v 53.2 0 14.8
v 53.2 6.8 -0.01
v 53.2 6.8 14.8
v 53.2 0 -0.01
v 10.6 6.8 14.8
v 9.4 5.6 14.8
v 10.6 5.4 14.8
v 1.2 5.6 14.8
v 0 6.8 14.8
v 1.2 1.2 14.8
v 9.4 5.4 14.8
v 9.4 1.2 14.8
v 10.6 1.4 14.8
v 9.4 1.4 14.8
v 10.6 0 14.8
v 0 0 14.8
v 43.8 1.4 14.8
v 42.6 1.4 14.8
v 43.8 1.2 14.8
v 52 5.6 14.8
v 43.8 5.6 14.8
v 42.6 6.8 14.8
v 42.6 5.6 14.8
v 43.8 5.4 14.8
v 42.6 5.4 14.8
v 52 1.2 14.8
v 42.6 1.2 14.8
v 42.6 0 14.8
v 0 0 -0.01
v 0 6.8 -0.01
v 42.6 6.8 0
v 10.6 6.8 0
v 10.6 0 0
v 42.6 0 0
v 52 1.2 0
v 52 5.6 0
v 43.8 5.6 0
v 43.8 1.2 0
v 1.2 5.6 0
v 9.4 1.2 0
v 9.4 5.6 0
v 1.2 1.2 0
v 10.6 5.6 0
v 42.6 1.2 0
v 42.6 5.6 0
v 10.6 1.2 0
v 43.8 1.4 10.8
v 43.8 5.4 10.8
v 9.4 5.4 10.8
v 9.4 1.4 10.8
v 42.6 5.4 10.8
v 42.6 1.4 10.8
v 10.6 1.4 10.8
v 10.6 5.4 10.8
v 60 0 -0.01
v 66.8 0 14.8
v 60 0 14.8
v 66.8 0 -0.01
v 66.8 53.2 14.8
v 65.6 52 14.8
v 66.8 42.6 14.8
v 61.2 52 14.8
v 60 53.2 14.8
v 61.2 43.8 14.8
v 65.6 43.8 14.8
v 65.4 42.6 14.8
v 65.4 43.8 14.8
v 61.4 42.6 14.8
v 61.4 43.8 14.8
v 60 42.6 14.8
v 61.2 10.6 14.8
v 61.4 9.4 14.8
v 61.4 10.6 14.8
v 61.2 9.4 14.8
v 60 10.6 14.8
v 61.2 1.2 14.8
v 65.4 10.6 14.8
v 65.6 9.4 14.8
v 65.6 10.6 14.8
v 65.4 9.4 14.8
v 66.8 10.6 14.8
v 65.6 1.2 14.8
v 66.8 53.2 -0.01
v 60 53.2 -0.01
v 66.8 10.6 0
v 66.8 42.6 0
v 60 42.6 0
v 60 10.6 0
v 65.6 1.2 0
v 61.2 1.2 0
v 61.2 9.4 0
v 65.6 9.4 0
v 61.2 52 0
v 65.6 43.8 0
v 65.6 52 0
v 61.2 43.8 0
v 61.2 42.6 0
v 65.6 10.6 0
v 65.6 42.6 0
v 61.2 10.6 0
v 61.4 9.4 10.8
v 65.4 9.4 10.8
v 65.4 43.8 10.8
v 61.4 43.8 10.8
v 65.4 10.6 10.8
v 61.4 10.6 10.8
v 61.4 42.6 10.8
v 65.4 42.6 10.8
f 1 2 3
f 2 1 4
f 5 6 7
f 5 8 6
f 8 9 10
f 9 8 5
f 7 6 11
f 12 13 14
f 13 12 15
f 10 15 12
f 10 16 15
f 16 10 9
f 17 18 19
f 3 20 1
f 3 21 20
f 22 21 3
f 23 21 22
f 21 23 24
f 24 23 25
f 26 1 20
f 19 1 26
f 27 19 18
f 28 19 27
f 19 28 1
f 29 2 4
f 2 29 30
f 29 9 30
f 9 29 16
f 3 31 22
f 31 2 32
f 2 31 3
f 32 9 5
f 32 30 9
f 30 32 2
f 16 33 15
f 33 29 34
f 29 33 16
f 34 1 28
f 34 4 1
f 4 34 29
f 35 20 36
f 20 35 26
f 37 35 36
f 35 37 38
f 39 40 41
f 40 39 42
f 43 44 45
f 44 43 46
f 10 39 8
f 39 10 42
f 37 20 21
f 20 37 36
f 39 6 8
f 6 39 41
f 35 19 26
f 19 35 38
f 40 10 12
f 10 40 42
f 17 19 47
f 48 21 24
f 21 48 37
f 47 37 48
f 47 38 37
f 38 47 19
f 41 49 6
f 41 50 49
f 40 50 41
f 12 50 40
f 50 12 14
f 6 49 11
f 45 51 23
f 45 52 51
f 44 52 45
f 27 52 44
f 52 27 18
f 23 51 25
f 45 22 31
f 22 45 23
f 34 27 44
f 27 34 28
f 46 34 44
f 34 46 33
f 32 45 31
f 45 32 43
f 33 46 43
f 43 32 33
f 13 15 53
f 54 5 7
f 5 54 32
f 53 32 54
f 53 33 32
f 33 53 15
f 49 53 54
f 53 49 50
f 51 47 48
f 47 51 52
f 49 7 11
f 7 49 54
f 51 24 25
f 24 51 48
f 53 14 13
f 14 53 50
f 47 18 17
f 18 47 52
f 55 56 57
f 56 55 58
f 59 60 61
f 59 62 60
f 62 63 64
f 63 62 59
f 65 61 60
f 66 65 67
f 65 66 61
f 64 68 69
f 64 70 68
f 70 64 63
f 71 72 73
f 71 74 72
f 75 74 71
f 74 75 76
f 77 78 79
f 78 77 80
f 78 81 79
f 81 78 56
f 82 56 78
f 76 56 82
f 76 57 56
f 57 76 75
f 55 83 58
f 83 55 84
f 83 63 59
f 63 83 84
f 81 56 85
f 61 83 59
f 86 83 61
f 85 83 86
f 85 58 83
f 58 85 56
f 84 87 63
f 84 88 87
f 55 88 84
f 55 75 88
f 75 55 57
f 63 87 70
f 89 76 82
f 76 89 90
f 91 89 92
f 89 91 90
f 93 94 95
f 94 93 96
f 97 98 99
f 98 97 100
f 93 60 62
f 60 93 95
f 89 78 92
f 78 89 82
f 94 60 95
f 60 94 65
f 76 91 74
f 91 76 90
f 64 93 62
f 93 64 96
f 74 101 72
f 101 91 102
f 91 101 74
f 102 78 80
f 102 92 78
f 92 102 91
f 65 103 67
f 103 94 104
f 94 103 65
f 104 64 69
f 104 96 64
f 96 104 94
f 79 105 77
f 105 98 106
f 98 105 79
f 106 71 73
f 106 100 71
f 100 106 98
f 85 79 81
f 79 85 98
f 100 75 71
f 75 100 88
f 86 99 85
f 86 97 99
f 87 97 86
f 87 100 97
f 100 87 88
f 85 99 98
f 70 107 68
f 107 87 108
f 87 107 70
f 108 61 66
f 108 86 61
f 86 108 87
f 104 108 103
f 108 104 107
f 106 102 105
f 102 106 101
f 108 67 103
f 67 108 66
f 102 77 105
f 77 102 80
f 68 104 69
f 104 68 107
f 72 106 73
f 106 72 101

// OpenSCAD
// file: ../../Base/Boxes.scad
// Fischertechnik Box Foundation
// Pre-designed Boxes

use <Constants.scad>

include <PlacementOptions.scad>

box190Width = 190;
box190Depth = 130;
box130Width = 130;
box130Depth = 95;
boxUsageHeight = 33.9;
boxWallThickness = 2.4;
boxBaseThickness = 1.0;

// getBoxWallThickness()
// Gets the wall thickness of a Fischertechnik Box

function getBoxWallThickness() = boxWallThickness;

// Gets the usable height of a fischertechnik box
function getBoxUsageHeight() = boxUsageHeight;

// Gets the thickness of the Fischertechnik box base.
function getBoxBaseThickness() = boxBaseThickness;

// Gets the usable inner space of a Box 190 as an x/y-list
function getBox190Space() = [
    box190Width - 2*getBoxWallThickness(), 
    box190Depth - 2*getBoxWallThickness() ];

// Imports the Fischertechnik empty box 130x190 mm and places it at position 0,0
// 190x130 are the outer sizes, the inner space is slightly smaller. Use getBox190Space() to get the inner sizes.
// This module needs the STL file "Fischertechnik Box 130x190.stl" in the library path.
// The box is positioned that the usable inner space is at the 0,0,0 position. The

module Box190() {
    translate([-getBoxWallThickness(),-getBoxWallThickness(),-getBoxBaseThickness()])
        import("Fischertechnik Box 130x190.stl", convexity=3);
}

// Gets the usable inner space of a Box 130 as an x/y-list
function getBox130Space() = [
    box130Width - 2*getBoxWallThickness(), 
    box130Depth - 2*getBoxWallThickness() ];

// Imports the Fischertechnik empty box 95x130 mm and places it at position 0,0
// 190x130 are the outer sizes, the inner space is slightly smaller. Use getBox190Space() to get the inner sizes.
// This module needs the STL file "Fischertechnik Box 95x130.stl" in the library path.
// The box is positioned that the usable inner space is at the 0,0,0 position. The

module Box130() {
    translate([-getBoxWallThickness(),-getBoxWallThickness(),-getBoxBaseThickness()])
        import("Fischertechnik Box 95x130.stl", convexity=3);
}

// Creates a web at the specified box walls
// corner 0 = LowerLeft, 1 = UpperLeft, 2 = UpperRight, 3 = LowerRight
// side 0 = LeftOfCorner, 1 = RightOfCorner
// distance = Distance in mm from the corner
// box = inner width and depth of the box (default: Box 190)
// webWidth = length of the web (default is 3 mms)
// webThickness = thickness of the web (default is 1 mm)

module BoxWeb(corner, side, distance, box=getBox190Space(), webWidth=3, webThickness=1.0) {
    sink = getBoxWallThickness()/2;

    width = (corner % 2 == 0) ? 
            (side == LeftOfCorner ? webWidth : webThickness) :
            (side == LeftOfCorner ? webThickness : webWidth);

    depth = (corner % 2 == 0) ? 
            (side == RightOfCorner ? webWidth : webThickness) :
            (side == RightOfCorner ? webThickness : webWidth);
    
    xDiff = corner == LowerLeft ? 
                (side == LeftOfCorner ? -sink : distance) :
            (corner == UpperLeft ?                
                (side == LeftOfCorner ? distance : -sink) :
            (corner == UpperRight ?
                (side == LeftOfCorner ? box.x-webWidth+sink : box.x-distance-webThickness) :
                (side == LeftOfCorner ? box.x-distance-webThickness: box.x-webWidth+sink)));

    yDiff = corner == LowerLeft ? 
                (side == RightOfCorner ? -sink : distance) :
            (corner == UpperLeft ?
                (side == RightOfCorner ? box.y-distance : box.y-webWidth+sink) :
            (corner == UpperRight ?
                (side == RightOfCorner ? box.y-webWidth+sink : box.y-distance) :
                (side == RightOfCorner ? distance : -sink)));
    
    translate([xDiff, yDiff, -getExcess()])
        cube([width, depth, boxUsageHeight + 2*getExcess()]);
}
// file: ../../Base/Rotation.scad
// Fischertechnik Box Foundation
// Geometry Helpers Rotation

include <PlacementOptions.scad>

// getRotatedSpace(space, rotation=NoRotation)
// Rotates the space dependent on the specified rotation

function getRotatedSpace(space, rotation=NoRotation) = [
    (rotation == Rotate90 || rotation == Rotate270) ? space.y : space.x,
    (rotation == Rotate90 || rotation == Rotate270) ? space.x : space.y
];

// Rotates the given space around the fixed left lower corner
// space = the space the children needs as width/depth list [width,depth]
// rotation = 0 Rotate0 degrees, 1 Rotate90 degrees, 2 Rotate180 degrees, 3 Rotate270 degrees (equivalent to -90)

module RotateFix(space, rotation=Rotate0) {
    dy = (rotation == Rotate0 || rotation == Rotate270) ? 0 :
        (rotation == Rotate90) ? space.x :
        space.y;
    dx = (rotation < Rotate180) ? 0 :
        (rotation == Rotate180) ? space.x :
        space.y;
    
    translate([dx, dy, 0])
        rotate([0, 0, rotations[rotation]])
            children();
}
// file: ../../Base/Alignment.scad
// Fischertechnik Box Foundation
// Geometry Helpers Alignment

include <PlacementOptions.scad>

// getAlignedX(elementWidth, spaceWidth, align=AlignRight, offset=0)
// Gets the aligned X offset of an element with the given
// width in the given space.
// elementWidth = The width of the element to positon
// spaceWidth = The space where the element should be aligned
// align = 0 AlignLeft, 1 AlignCenter, 2 AlignRight
// offset = an optional offset from the aligned position. When
// aligned left or centered, then positive values are in X direction.
// When aligned right then positive values are in negative X direction.

function getAlignedX(elementWidth, spaceWidth, align=AlignRight, offset=0) =
    (align == AlignLeft) ?
        offset :
        ((align == AlignCenter) ?
        (spaceWidth - elementWidth)/2 + offset :
        spaceWidth - offset - elementWidth);

// getAlignedY(elementDepth, spaceDepth, align=AlignTop, offset=0)
// Gets the aligned Y offset of an element with the given
// depth in the given space.
// elementDepth = The depth of the element to positon
// spaceDepth = The space where the element should be aligned
// align = 0 AlignBottom, 1 AlignCenter, 2 AlignTop
// offset = an optional offset from the aligned position. When
// aligned bottom or centered, then positive values are in Y direction.
// When aligned top then positive values are in negative Y direction.

function getAlignedY(elementDepth, spaceDepth, align=AlignTop, offset=0) =
    (align == AlignBottom) ?
        offset :
        ((align == AlignCenter) ?
        (spaceDepth - elementDepth)/2 + offset :
        spaceDepth - offset - elementDepth);
// file: ../../Base/Constants.scad
// Fischertechnik Box Foundation
// Constants

// Constant values necessary for multiple elements

// Base constants
dividerThickness = 1.2;
excess = 0.01;
fragments = 90;
tolerance = 0.8;

// Gets the thickness of a divider 
function getDividerThickness() = dividerThickness;

// Gets the excess that is used to merge walls into each other
function getExcess() = excess;

// Gets amount of fragments of a cylinder
function getFragments() = fragments;

// Gets the inner tolerance of a frame to each side
function getTolerance() = tolerance;


// Fischertechnik specific constants
axisDiameter = 4;
axisBottomDiameter = axisDiameter + 1;
standardEdgeDistance = 2.5;
standardWebDistance = 11.5;
standardCornerLength = 15;
tubeWallFactor = 1.6;

// Gets axis diameter
function getAxisDiameter() = axisDiameter;

// Gets axis bottom diameter for thicker part at the bottom
function getAxisBottomDiameter() = axisBottomDiameter;

// gets the standard distance to the wall of the box for dockable frames with webs
function getStandardEdgeDistance() = standardEdgeDistance;

// gets the standard distance of each web to the corner of the dockable frame
function getStandardWebDistance() = standardWebDistance;

// gets the standard length of the corner walls of a dockable frame
function getStandardCornerLength() = standardCornerLength;

// gets the wall thickness of a tube.
function getTubeWallThickness() = tubeWallFactor * getDividerThickness();
// file: ../../Base/PlacementOptions.scad
// Fischertechnik Box Foundation
// Placement Options

// Alignment
NoAlign = 0;
AlignLeft = 1;
AlignBottom = 2;
AlignCenter = 3;
AlignRight = 4;
AlignTop = 5;

// Element rotation degree steps
rotations = [0, -90, -180, -270];

// Rotation
NoRotation = 0;
Rotate0 = 0;
Rotate90 = 1;
Rotate180 = 2;
Rotate270 = 3;

// Docking (seen from above)
NoDock = -1;
DockLeft = 0;
DockTop = 1;
DockRight = 2;
DockCorner = 2;
DockBottom = 3;

// Web corners
LowerLeft = 0;
UpperLeft = 1;
UpperRight = 2;
LowerRight = 3;

// Web position relative to corner
LeftOfCorner = 0;
RightOfCorner = 1;
// file: ../../Elements/FrameAxis50.scad
// Fischertechnik Box Library
// Frame for single 50 mm Axis
// 31033

use <../Base/Constants.scad>
use <../ModelBase/Complex.scad>

length = 50;

// getFrameAxis50Space()
// Gets the width (.x) and depth (.y) of the axis frame.

function getFrameAxis50Space() = getFrameAxisSpace(length);

// FrameAxis50()
// Axis holder for a single 50 mm axis.

module FrameAxis50() {
    FrameAxis(length);
}

// Test
color("lightgray")
FrameAxis50();
// file: ../../Base/Placement.scad
// Fischertechnik Box Foundation
// Geometry Helpers Placement

use <Constants.scad>
use <Alignment.scad>
use <Rotation.scad>
use <Boxes.scad>

include <PlacementOptions.scad>

// Place(x=0, y=0, elementSpace=[0,0], alignX=AlignLeft, alignY=AlignBottom, rotation=Rotate0, boxSpace=getBox190Space())
// Places the child at the specified position
// y = Y-Position. This is a relative position when an X aligment is specified.
// x = X-Position. This is a relative position when an Y aligment is specified.
// elementSpace = space of the element to be placed [x,y]
// alignX = -1=NoAlign, 0 AlignLeft, 1 AlignCenter, 3 AlignRight (elementSpace and boxSpace required!)
// alignY = -1=NoAlign, 2 AlignBottom, 1 AlignCenter, 4 AlignTop (elementSpace and boxSpace required!)
// rotation = 0 Rotate0 0 degrees, 1 Rotate90 90 degrees, 
// 2 Rotate180 180 degrees, 3 Rotate270 270 degrees (equivalent to -90)
// boxSpace = Inner space of the box where the placement occurs [x,y] - default is Box 190x130 inner space

module Place(x=0, y=0, elementSpace=[0,0], 
  alignX=AlignLeft, alignY=AlignBottom, 
  rotation=NoRotation, boxSpace=getBox190Space()) {

    module Position(x, y, space, rotation=Rotate0) {
        translate([x, y, 0])
            RotateFix(space, rotation)
                children(0);
    }

    space = getRotatedSpace(elementSpace, rotation);
    alignedX = getAlignedX(space.x, boxSpace.x, alignX, x);
    alignedY = getAlignedY(space.y, boxSpace.y, alignY, y);
    Position(alignedX, alignedY, elementSpace, rotation)
        children(0);
}

// Center(space=getBox130Space(), elementSpace=[0,0])
// space = Space where the children is centered. For cylinder use centered=true and no elementSpace.
// elementSpace = space of the element to be centered [x,y]

module Center(space=getBox190Space(), elementSpace=[0,0]) {
    translate([(space.x - elementSpace.x) / 2, (space.y - elementSpace.y) / 2])
        children(0);
}

// CenterHorizontal(width=0, y=0, offset=0, space=getBox130Space())
// space = Space where the children is centered. For cylinder use centered=true and no elementSpace.
// elementSpace = space of the element to be centered [x,y]

module CenterHorizontal(width=0, y=0, offset=0, space=getBox190Space()) {
    translate([(space.x - width) / 2 + offset, y])
        children(0);
}

// CenterVertical(depth=0, x=0, offset=0, space=getBox130Space())
// space = Space where the children is centered. For cylinder use centered=true and no elementSpace.
// elementSpace = space of the element to be centered [x,y]

module CenterVerticalal(depth=0, x=0, offset=0, space=getBox190Space()) {
    translate([x, (space.y - depth) / 2 + offset])
        children(0);
}
// main file
// Fischertechnik Box Foundation
// Elements
// Test FrameAxis50

use <../../Base/Placement.scad>
use <../../Elements/FrameAxis50.scad>

include <../../Base/PlacementOptions.scad>

FrameAxis50();

Place(60, 0, elementSpace=getFrameAxis50Space(), rotation=Rotate90)
    FrameAxis50();
